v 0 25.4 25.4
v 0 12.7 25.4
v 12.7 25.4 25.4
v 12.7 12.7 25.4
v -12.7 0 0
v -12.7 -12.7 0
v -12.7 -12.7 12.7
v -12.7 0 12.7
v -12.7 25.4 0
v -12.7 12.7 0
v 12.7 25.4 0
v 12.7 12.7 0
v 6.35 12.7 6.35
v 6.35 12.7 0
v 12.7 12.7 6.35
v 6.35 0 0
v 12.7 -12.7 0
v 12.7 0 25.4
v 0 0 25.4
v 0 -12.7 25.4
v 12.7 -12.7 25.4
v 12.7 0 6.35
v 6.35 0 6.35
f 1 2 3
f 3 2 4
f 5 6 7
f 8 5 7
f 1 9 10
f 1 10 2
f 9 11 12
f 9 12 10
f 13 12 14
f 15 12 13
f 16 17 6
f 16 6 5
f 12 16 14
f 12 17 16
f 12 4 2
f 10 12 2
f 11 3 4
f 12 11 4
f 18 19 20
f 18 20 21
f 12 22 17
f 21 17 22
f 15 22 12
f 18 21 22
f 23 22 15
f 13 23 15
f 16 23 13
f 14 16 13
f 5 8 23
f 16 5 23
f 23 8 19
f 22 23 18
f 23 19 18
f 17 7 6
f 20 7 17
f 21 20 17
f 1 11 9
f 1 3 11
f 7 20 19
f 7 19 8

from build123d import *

# Parameters (mm, degrees)
F0_W      = 12.7
F0_H      = 25.4
F1_DEPTH  = 12.7
F2_W      = 12.7
F2_H      = 12.7
F3_DEPTH  = 12.7
F5_DEPTH  = 12.7
F6_W      = 12.7
F6_H      = 6.35
F7_DEPTH  = 6.35
F8_W      = 12.7
F8_H      = 12.7
F9_DEPTH  = 25.4
F11_DEPTH = 12.7


with BuildPart() as f1:
    # F0 (on Front) → F1 (new body)
    with BuildSketch(Plane.XZ):
        with Locations((6.35, 12.7)):
            Rectangle(F0_W, F0_H)
    extrude(amount=F1_DEPTH)

    # F2 (on face) → F3 (join)
    with BuildSketch(Plane.XZ.offset(12.7)):
        with Locations((-6.35, 6.35)):
            Rectangle(F2_W, F2_H)
    extrude(amount=-F3_DEPTH)

    # F4 (on face) → F5 (join)
    with BuildSketch(Plane.XZ.offset(12.7)):
        Polygon((0, 25.4), (-12.7, 12.7), (0, 12.7), align=None)
    extrude(amount=-F5_DEPTH)

    # F6 (on face) → F7 (join)
    with BuildSketch(Plane.YZ.offset(12.7)):
        with Locations((6.35, 3.175)):
            Rectangle(F6_W, F6_H)
    extrude(amount=-F7_DEPTH)


with BuildPart() as f9:
    # F8 (on face) → F9 (new body)
    with BuildSketch(Plane(origin=(0, 0, 0), x_dir=(1, 0, 0), z_dir=(0, 0, -1))):
        with Locations((6.35, -19.05)):
            Rectangle(F8_W, F8_H)
    extrude(amount=-F9_DEPTH)

    # F10 (on face) → F11 (join)
    with BuildSketch(Plane(origin=(0, 25.4, 0), x_dir=(-1, 0, 0), z_dir=(0, 1, 0))):
        Polygon((0, 25.4), (0, 0), (12.7, 0), align=None)
    extrude(amount=-F11_DEPTH)


solid = Compound([f1.part, f9.part])
